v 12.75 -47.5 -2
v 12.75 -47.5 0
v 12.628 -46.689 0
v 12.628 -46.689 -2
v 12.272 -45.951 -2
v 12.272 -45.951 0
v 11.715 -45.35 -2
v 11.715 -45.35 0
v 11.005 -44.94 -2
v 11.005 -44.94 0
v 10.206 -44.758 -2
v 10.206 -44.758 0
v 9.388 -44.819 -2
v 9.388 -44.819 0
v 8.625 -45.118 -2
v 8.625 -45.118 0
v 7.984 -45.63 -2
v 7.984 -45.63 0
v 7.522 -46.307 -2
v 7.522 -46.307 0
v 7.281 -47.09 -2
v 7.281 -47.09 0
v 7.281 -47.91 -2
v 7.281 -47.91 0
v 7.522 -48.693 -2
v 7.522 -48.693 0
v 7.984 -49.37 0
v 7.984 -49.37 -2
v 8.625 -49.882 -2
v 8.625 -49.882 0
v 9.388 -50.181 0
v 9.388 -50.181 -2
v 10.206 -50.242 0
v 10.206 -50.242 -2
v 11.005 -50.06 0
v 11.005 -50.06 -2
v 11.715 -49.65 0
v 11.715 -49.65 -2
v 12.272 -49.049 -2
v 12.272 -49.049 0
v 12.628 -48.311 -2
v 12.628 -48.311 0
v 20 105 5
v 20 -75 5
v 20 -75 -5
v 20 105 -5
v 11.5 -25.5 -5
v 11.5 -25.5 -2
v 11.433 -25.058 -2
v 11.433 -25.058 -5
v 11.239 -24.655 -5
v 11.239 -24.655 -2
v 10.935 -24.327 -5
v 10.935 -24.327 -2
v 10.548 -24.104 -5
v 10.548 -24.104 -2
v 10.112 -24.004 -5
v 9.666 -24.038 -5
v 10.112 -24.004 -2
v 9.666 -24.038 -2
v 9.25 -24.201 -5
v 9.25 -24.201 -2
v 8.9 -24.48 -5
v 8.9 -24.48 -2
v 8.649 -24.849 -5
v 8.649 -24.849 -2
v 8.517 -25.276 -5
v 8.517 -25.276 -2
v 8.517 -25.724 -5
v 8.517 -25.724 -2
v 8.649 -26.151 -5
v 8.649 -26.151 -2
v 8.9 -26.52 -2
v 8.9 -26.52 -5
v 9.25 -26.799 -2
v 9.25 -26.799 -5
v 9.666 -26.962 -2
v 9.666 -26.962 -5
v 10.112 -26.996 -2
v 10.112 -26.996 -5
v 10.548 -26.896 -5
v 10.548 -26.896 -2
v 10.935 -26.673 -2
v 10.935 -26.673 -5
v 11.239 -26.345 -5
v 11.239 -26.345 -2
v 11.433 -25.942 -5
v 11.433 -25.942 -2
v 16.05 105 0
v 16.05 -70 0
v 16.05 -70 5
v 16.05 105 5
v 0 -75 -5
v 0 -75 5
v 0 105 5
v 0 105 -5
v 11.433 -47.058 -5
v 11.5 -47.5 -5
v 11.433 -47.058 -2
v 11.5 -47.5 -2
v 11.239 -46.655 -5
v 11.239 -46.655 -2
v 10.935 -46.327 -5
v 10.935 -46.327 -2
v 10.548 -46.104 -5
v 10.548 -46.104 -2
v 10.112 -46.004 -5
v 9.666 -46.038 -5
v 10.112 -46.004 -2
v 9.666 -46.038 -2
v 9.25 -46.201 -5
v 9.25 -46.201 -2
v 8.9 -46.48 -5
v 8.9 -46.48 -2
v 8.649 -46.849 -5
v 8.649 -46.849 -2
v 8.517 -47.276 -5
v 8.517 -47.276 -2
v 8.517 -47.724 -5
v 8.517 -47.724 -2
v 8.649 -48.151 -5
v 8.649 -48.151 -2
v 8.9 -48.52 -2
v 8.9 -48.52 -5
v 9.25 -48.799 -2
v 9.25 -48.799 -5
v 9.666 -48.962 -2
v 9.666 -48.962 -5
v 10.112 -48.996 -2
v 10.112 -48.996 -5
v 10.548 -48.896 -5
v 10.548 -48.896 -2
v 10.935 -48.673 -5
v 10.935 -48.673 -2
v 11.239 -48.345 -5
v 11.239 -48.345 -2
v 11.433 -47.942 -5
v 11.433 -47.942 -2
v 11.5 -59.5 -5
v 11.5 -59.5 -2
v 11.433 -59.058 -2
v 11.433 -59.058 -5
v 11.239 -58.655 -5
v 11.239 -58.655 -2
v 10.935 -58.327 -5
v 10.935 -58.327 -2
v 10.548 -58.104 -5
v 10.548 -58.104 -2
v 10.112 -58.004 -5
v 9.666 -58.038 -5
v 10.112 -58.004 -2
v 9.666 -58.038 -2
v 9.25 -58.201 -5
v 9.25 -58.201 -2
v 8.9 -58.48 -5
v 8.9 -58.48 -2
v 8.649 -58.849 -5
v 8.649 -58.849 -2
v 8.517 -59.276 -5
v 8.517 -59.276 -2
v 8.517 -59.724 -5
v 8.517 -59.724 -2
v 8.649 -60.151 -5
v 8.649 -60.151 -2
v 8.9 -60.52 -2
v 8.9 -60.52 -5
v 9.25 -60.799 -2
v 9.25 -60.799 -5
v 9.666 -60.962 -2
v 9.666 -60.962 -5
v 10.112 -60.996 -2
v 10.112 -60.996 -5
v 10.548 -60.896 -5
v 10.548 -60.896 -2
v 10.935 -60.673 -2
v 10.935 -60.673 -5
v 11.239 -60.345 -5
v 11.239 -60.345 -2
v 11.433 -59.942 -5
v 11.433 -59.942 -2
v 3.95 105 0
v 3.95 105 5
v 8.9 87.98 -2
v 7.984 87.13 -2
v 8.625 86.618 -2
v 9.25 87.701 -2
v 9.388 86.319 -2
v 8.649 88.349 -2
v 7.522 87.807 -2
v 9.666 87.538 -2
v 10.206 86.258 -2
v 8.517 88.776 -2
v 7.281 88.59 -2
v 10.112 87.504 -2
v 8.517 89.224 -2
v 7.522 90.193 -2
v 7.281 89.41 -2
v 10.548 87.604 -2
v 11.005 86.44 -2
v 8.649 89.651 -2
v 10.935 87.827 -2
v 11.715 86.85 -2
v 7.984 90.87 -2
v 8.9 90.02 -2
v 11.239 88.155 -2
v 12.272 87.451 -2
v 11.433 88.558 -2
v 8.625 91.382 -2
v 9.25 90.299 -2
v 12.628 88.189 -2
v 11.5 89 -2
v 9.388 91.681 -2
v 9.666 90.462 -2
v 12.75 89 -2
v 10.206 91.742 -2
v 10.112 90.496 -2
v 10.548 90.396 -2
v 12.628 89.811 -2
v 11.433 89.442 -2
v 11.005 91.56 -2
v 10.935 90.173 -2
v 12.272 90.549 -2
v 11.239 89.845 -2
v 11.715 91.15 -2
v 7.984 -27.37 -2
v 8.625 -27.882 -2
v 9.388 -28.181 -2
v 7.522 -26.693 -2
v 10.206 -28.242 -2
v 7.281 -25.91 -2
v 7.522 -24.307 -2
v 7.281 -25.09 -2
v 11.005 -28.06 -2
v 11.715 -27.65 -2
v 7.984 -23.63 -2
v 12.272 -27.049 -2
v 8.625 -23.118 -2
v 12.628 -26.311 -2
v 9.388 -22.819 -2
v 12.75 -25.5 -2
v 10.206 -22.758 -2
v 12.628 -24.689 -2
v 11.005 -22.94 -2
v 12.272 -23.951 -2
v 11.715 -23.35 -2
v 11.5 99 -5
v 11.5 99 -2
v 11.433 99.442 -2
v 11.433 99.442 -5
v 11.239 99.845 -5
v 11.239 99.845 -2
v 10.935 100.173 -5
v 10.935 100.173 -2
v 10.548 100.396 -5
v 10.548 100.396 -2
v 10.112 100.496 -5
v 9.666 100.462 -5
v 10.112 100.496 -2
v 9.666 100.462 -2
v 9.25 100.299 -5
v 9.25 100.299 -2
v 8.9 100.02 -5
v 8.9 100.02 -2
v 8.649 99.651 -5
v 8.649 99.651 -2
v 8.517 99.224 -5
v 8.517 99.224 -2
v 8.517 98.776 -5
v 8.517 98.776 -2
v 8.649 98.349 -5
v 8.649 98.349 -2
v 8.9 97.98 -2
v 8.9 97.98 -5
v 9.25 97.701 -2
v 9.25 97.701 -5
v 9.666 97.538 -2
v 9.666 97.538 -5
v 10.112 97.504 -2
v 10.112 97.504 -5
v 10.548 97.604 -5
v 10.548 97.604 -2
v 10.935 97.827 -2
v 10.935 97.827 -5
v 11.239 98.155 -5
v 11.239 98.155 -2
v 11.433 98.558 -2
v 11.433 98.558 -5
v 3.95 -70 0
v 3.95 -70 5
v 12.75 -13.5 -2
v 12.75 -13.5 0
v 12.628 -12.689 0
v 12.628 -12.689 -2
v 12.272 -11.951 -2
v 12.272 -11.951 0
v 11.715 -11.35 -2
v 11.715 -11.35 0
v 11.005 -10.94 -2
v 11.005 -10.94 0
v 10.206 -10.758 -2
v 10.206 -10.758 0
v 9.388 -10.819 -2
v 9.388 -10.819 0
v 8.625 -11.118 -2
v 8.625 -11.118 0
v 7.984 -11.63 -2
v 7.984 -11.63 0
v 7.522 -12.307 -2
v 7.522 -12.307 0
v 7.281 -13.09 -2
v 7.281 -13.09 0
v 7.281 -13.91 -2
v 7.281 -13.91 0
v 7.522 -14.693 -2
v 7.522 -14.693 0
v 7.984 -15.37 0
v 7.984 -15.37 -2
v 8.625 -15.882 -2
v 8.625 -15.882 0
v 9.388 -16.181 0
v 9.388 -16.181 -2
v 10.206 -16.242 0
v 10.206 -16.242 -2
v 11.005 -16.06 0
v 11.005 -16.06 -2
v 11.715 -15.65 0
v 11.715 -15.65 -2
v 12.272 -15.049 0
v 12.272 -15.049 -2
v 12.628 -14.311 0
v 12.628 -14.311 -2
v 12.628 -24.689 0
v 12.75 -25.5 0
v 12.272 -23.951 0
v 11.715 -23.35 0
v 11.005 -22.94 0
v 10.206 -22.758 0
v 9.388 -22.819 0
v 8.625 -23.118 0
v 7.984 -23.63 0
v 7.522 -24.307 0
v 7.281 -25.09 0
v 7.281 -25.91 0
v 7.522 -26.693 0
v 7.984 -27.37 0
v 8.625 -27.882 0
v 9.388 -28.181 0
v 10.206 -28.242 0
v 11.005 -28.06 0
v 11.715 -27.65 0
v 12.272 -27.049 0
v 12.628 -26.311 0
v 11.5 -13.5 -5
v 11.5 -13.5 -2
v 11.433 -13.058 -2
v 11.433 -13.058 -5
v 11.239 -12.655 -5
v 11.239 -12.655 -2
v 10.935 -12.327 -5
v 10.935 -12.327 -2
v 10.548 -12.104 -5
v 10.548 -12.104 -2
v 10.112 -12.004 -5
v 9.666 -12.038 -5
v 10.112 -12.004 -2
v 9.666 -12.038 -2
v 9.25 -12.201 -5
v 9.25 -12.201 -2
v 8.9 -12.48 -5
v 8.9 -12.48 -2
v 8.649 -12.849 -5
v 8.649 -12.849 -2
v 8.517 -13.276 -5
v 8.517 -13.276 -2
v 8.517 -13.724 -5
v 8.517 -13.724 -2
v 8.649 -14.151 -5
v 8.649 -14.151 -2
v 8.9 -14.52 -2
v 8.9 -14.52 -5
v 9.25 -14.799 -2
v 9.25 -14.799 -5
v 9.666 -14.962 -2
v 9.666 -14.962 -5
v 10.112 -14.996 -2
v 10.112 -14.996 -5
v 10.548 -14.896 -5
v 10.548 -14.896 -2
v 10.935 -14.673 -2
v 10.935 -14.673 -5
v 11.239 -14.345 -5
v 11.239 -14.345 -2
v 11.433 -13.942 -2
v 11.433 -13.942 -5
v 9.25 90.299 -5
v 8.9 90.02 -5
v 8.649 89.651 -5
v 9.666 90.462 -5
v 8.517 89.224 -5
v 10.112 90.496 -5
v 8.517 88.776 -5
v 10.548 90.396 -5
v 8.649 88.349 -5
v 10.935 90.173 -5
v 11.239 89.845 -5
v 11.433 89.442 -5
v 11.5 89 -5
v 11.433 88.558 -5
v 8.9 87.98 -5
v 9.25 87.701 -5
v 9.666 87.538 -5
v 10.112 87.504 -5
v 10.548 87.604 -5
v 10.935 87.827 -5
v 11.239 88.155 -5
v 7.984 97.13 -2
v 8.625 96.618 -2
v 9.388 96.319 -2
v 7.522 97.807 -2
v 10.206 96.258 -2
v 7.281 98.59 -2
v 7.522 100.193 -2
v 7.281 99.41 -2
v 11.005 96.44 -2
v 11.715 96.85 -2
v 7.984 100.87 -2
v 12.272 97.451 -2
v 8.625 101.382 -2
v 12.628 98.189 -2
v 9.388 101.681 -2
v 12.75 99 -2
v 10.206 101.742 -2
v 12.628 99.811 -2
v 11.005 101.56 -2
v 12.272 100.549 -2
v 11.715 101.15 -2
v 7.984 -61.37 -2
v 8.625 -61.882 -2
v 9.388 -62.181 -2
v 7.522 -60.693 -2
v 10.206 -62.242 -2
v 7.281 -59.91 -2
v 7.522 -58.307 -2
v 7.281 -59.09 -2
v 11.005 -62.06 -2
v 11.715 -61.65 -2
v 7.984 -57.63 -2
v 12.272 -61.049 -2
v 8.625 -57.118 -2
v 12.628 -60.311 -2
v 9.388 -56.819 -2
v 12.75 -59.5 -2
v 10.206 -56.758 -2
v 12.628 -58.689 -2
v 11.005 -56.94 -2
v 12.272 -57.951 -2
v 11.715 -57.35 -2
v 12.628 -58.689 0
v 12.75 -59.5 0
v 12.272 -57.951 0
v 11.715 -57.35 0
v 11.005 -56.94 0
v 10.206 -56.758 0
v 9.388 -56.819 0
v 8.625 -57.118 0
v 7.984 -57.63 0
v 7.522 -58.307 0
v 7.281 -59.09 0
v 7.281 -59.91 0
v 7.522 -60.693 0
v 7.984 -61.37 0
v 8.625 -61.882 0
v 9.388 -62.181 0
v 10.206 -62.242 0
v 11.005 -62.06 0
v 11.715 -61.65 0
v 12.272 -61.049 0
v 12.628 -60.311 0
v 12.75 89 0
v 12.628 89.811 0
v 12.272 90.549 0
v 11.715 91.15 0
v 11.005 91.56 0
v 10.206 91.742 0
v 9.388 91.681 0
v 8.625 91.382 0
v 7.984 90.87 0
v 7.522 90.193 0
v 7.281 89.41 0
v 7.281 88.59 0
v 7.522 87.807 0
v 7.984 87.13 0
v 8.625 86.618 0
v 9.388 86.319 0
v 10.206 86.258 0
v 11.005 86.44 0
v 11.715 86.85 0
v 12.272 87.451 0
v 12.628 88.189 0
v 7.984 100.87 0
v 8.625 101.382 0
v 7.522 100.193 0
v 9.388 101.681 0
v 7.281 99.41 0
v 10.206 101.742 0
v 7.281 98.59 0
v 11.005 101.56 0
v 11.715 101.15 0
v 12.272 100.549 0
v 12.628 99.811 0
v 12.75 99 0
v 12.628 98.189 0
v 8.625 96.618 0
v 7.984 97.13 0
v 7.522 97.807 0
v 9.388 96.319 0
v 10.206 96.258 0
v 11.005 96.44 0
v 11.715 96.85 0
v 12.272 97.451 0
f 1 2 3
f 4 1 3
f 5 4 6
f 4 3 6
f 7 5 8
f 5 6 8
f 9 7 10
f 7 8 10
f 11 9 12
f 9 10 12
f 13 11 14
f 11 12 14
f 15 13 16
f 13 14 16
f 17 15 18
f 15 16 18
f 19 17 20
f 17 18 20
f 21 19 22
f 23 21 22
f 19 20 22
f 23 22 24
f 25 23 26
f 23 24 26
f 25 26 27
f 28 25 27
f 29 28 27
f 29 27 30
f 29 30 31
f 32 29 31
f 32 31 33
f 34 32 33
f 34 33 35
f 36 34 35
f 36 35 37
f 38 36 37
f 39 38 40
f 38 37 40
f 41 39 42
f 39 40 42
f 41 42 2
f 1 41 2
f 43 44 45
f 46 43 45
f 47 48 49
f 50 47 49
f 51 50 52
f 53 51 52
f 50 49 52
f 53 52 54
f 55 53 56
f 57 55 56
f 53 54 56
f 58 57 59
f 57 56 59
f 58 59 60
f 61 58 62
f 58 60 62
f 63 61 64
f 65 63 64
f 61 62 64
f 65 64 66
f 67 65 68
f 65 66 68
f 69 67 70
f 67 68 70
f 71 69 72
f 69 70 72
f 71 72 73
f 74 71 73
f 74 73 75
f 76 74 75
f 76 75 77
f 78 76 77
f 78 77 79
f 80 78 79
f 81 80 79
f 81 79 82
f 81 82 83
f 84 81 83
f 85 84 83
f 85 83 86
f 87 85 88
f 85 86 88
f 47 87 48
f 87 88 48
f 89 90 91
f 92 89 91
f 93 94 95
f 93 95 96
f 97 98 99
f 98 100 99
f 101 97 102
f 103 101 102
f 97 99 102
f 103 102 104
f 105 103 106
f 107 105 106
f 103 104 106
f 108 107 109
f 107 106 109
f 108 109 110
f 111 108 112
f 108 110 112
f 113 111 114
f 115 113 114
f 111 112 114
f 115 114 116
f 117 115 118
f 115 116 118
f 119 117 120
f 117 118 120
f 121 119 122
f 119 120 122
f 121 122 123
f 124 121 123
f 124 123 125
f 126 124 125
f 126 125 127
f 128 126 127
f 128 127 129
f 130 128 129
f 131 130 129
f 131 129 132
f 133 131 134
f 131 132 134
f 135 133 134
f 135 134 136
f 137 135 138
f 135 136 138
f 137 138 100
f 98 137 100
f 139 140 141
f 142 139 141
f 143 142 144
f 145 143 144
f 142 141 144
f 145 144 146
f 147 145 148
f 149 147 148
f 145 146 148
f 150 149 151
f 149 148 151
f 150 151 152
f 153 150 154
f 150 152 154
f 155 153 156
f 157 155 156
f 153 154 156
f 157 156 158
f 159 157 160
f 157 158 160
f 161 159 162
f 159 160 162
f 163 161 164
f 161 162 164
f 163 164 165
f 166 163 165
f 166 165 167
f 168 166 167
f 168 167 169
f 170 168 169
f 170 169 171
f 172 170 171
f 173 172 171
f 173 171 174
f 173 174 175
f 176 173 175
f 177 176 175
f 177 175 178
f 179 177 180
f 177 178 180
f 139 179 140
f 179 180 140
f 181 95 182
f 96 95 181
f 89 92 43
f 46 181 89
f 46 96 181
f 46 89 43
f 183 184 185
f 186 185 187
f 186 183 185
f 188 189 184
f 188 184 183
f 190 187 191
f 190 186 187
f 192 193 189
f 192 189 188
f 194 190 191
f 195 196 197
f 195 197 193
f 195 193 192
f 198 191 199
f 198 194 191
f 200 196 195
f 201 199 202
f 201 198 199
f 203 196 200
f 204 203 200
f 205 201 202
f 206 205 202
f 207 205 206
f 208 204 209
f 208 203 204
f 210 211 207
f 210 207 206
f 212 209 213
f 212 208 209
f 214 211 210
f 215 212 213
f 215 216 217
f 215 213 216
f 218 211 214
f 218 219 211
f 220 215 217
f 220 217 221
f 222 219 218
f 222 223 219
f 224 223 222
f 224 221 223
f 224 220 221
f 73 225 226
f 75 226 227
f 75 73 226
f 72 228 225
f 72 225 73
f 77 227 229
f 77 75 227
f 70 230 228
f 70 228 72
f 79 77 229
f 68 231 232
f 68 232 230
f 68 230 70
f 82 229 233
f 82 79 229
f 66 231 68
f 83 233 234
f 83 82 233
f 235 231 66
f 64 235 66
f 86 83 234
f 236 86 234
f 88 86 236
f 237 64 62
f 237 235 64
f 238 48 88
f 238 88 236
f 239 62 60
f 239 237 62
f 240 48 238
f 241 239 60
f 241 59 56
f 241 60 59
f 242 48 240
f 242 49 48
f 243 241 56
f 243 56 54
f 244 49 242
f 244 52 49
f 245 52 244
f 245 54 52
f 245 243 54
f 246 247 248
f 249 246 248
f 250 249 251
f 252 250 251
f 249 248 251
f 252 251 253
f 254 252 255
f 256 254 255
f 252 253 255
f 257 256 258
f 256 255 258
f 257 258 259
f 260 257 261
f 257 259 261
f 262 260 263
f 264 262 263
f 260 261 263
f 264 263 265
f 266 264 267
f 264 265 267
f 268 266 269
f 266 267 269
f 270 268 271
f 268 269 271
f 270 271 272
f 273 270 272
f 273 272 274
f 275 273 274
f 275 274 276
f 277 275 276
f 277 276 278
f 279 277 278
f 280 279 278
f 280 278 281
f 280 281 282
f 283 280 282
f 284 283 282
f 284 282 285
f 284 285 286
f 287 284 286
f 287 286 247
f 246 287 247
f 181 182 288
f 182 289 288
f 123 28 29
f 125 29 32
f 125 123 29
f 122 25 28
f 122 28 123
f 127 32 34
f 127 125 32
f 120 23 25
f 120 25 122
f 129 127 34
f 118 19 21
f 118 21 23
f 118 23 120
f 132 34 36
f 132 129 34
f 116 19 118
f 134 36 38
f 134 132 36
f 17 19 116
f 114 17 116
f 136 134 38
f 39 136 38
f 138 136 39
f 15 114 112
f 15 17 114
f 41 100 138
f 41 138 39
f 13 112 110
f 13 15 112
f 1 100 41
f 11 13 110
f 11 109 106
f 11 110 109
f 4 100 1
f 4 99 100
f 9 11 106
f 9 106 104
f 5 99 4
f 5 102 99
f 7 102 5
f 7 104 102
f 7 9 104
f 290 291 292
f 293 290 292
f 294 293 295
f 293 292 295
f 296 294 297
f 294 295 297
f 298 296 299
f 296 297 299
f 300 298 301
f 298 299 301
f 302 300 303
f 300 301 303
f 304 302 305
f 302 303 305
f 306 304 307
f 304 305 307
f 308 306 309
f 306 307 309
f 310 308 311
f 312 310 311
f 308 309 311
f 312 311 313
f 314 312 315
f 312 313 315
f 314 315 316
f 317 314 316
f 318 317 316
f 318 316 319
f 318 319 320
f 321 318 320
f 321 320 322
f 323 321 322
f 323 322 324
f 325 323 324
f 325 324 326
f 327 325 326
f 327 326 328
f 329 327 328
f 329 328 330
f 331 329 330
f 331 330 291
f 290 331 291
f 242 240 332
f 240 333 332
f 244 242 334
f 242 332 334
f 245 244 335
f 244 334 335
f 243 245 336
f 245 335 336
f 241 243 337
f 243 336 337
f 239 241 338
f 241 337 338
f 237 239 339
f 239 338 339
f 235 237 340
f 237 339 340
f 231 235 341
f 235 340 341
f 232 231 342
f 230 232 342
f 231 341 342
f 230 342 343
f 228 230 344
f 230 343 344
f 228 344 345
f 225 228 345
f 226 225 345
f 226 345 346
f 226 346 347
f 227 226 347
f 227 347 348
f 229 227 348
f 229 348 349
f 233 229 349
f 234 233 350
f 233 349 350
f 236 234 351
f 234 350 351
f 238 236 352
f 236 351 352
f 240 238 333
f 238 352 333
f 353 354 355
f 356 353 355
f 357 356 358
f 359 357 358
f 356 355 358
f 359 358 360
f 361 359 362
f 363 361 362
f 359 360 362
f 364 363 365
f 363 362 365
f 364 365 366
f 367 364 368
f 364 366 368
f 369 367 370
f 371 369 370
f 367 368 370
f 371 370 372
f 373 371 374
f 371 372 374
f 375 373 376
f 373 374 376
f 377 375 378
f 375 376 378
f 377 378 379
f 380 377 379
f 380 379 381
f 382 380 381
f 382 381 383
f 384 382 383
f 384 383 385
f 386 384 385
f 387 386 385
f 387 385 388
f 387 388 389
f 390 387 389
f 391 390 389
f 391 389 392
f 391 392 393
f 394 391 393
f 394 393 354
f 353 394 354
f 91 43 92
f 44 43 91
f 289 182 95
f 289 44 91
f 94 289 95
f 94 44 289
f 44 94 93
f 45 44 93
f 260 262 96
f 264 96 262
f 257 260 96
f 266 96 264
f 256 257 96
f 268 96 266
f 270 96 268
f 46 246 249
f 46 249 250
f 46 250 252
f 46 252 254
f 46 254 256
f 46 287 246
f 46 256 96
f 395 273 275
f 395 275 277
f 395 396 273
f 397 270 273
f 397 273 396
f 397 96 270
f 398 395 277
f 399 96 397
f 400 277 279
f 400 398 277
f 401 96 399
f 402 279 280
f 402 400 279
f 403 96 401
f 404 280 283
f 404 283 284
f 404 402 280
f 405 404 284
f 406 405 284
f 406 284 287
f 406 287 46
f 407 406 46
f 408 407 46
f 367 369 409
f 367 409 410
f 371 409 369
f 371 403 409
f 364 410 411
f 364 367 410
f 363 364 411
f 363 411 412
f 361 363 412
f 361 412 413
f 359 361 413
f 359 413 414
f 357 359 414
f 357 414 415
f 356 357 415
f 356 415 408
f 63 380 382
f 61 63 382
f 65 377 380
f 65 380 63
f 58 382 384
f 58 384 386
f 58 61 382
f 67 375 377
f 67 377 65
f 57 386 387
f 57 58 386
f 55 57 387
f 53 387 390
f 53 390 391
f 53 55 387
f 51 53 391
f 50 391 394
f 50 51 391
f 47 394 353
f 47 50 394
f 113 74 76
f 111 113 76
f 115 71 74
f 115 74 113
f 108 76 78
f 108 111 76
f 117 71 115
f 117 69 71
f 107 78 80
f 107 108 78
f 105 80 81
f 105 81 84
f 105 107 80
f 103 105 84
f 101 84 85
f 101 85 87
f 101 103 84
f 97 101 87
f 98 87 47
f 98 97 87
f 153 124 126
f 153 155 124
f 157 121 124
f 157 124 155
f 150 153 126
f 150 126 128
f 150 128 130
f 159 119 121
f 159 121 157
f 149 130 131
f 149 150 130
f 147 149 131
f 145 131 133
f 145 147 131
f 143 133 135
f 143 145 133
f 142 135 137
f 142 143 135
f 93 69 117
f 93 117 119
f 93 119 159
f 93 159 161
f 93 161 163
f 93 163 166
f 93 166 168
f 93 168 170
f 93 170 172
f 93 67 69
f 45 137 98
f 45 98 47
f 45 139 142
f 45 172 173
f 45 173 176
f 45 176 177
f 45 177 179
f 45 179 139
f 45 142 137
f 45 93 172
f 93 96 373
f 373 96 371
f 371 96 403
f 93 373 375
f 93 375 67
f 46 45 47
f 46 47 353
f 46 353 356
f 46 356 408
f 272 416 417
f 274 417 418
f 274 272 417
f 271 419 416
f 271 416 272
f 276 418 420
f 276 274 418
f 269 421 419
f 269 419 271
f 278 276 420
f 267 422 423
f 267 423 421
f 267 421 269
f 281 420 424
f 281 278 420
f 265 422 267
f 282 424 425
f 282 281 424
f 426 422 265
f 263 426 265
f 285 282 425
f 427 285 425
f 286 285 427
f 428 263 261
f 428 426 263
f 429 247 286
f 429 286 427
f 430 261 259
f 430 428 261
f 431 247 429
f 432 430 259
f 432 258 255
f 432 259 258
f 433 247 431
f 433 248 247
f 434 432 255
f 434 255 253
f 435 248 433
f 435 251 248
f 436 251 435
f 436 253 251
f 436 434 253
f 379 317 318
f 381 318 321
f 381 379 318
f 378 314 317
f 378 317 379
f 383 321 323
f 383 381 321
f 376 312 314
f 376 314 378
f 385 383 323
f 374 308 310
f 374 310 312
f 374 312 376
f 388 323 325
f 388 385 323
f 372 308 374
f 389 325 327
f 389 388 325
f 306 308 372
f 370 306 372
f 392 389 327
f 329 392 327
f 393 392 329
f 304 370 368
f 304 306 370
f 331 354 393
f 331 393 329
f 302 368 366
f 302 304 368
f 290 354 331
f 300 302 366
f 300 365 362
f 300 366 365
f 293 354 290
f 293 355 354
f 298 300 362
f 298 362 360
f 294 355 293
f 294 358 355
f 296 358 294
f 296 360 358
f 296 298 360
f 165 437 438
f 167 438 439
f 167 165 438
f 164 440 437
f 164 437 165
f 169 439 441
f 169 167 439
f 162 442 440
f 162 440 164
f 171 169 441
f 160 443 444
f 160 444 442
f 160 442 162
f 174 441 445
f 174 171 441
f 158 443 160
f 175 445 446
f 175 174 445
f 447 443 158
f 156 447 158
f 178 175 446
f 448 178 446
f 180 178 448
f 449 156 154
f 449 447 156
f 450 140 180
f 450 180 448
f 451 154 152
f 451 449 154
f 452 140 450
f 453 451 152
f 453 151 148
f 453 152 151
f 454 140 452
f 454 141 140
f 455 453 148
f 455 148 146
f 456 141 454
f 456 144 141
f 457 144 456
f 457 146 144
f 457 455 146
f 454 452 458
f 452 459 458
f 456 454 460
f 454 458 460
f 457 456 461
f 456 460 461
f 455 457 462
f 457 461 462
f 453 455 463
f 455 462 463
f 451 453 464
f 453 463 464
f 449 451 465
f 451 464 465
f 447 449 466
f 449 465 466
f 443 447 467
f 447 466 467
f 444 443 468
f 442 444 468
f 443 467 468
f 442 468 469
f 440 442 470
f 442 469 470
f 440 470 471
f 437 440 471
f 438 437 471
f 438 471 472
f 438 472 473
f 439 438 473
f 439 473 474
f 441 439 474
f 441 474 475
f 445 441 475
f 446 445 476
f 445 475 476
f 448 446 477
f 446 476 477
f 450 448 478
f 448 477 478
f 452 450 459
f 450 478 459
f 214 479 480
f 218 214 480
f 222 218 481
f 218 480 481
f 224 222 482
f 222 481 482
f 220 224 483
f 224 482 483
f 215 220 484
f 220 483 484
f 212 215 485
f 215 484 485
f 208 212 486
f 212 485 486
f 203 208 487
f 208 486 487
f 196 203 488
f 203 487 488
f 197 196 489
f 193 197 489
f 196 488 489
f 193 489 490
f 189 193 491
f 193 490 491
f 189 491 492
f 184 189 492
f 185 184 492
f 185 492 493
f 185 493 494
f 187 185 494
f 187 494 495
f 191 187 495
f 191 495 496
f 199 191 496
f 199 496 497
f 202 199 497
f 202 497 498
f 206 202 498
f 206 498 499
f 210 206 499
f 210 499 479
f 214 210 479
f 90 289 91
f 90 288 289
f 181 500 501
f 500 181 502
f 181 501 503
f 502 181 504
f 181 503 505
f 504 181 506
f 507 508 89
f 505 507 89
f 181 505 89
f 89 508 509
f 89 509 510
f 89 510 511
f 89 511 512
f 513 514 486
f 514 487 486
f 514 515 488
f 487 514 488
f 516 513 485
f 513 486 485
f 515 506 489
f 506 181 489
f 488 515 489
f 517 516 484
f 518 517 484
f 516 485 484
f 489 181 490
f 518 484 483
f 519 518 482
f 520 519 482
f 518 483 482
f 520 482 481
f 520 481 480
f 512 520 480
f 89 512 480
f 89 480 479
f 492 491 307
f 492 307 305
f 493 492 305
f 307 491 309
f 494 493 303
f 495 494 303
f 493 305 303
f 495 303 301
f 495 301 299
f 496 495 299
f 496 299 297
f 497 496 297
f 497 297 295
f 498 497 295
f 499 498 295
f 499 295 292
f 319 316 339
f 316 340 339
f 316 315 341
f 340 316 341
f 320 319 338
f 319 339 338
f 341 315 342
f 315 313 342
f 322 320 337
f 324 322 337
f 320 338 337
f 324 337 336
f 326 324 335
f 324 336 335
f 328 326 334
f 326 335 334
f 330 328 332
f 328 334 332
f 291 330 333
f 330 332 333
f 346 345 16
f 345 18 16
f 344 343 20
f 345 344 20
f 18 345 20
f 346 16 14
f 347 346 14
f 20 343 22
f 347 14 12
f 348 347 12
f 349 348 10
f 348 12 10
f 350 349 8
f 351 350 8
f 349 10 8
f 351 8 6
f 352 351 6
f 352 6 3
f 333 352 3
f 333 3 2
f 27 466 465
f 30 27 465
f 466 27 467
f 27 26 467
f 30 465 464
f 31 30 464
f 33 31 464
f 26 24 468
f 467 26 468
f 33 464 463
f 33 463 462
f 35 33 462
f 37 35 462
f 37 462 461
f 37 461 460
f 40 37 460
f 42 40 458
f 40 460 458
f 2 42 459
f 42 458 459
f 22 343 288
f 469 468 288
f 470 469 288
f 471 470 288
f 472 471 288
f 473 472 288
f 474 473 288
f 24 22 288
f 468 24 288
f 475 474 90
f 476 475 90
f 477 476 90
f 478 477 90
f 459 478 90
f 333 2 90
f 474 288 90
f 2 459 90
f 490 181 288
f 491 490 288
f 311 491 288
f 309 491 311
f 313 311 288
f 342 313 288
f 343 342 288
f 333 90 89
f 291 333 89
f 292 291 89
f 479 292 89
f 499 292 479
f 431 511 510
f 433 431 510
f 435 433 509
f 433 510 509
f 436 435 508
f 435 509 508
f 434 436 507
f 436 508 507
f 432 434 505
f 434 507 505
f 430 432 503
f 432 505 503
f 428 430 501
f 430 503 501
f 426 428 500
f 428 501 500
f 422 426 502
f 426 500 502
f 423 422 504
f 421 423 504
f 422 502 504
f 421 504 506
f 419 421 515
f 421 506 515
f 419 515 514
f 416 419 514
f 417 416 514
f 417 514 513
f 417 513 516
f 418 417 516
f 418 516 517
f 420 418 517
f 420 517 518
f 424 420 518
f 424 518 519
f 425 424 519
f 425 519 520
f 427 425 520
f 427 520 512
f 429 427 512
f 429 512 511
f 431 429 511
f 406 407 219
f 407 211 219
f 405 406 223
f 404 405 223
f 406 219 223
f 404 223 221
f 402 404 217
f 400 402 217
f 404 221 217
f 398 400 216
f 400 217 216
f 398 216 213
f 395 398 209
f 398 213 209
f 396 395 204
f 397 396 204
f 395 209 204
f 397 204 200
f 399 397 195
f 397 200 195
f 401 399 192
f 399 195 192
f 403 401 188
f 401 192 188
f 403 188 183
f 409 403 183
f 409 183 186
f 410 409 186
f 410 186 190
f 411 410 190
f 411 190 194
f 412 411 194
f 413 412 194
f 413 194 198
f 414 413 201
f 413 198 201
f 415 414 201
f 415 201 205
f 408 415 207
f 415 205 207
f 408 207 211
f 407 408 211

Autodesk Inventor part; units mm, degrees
ref_plane "YZ Plane" through (0, 0, 0) normal (1, 0, 0) x (0, 1, 0)
ref_plane "XZ Plane" through (0, 0, 0) normal (0, 1, 0) x (-1, 0, 0)
ref_plane "XY Plane" through (0, 0, 0) normal (0, 0, 1) x (1, 0, 0)
sketch "Sketch1" plane through (0, 0, 0) normal (1, 0, 0) x (0, 1, 0)
  line L0 (75, 5) -> (-75, 5)
  line L1 (-75, 5) -> (-75, -5)
  line L2 (-75, -5) -> (75, -5)
  line L3 (75, -5) -> (75, 5)
  line L4 (75, 5) -> (-75, -5) construction
  line L5 (-75, 5) -> (75, -5) construction
  point P0 (0, 0)
  dimension "d0" = 150
  dimension "d1" = 10
extrude "Extrusion1" add sketch "Sketch1" along normal blind 20
sketch "Sketch2" plane through (0, 75, 5) normal (0, 1, 0) x (1, 0, 0)
  line L0 (16.05, -5) -> (3.95, -5)
  line L1 (3.95, -5) -> (3.95, 5)
  line L2 (3.95, 5) -> (16.05, 5)
  line L3 (16.05, 5) -> (16.05, -5)
  line L4 (0, 0) -> (20, 0) projected
  line L5 (16.05, -5) -> (3.95, 5) construction
  line L6 (3.95, -5) -> (16.05, 5) construction
  point P0 (0, 5)
  point P1 (10, 0)
  point P2 (3.95, 0)
  point P3 (16.05, 0)
  dimension "d4" = 12.1
extrude "Extrusion2" cut sketch "Sketch2" against normal blind 145 contours L4 L1 L2 L3
sketch "Sketch3" plane through (3.95, 75, 0) normal (0, 0, 1) x (1, 0, 0)
  circle A0 centre (6.05, -134.5) radius 1.5
  line L0 (0, -145) -> (0, 0) projected
  line L1 (12.1, -145) -> (0, -145) projected
  circle A1 centre (6.05, -122.5) radius 1.5
  circle A2 centre (6.05, -122.5) radius 2.75
  circle A3 centre (6.05, -134.5) radius 2.75
  line L2 (1.5875, -111.5) -> (10.0422, -111.5)
  circle A4 centre (6.05, -88.5) radius 1.5
  circle A5 centre (6.05, -100.5) radius 1.5
  circle A6 centre (6.05, -100.5) radius 2.75
  circle A7 centre (6.05, -88.5) radius 2.75
  point P0 (-3.95, -75)
  point P1 (6.05, -145)
  dimension "d7" = 3
  dimension "d8" = 6.05
  dimension "d9" = 10.5
  dimension "d10" = 3
  dimension "d11" = 12
  dimension "d12" = 5.5
  dimension "d13" = 5.5
  dimension "d34" = 11
extrude "Extrusion3" cut sketch "Sketch3" against normal blind 5 contours A0 | A1 | A4 | A5
extrude "Extrusion4" cut sketch "Sketch3" against normal blind 2
sketch "Sketch4" plane through (0, 75, 5) normal (0, 1, 0) x (1, 0, 0)
  line L0 (0, 0) -> (0, 10) projected
  line L1 (0, 0) -> (0, 10)
  line L2 (20, 0) -> (20, 10) projected
  line L3 (0, 10) -> (20, 10)
  line L4 (20, 10) -> (20, 0)
  line L5 (16.05, 5) -> (16.05, 0) projected
  line L6 (20, 0) -> (16.05, 0)
  line L7 (3.95, 5) -> (16.05, 5) projected
  line L8 (16.05, 0) -> (16.05, 5)
  line L9 (16.05, 5) -> (3.95, 5)
  line L10 (3.95, 0) -> (3.95, 5) projected
  line L11 (3.95, 5) -> (3.95, 0)
  line L12 (3.95, 0) -> (0, 0)
  point P0 (0, 5)
extrude "Extrusion5" add sketch "Sketch4" along normal blind 30
sketch "Sketch6" plane through (3.95, -70, 0) normal (0, 0, 1) x (1, 0, 0)
  circle A0 centre (6.05, 169) radius 1.5
  circle A1 centre (6.05, 159) radius 1.5
  line L0 (0, 175) -> (12.1, 175) projected
  circle A2 centre (6.05, 169) radius 2.75
  circle A3 centre (6.05, 159) radius 2.75
  point P0 (-3.95, 70)
  point P1 (6.05, 175)
  dimension "d24" = 3
  dimension "d25" = 3
  dimension "d26" = 6
  dimension "d27" = 10
  dimension "d28" = 5.5
  dimension "d29" = 5.5
extrude "Extrusion6" cut sketch "Sketch6" against normal blind 5 contours A0 | A1
extrude "Extrusion7" cut sketch "Sketch6" against normal blind 2 contours A1 | A2 | A3
properties part number "Tiang Lifter_3DPrint"
